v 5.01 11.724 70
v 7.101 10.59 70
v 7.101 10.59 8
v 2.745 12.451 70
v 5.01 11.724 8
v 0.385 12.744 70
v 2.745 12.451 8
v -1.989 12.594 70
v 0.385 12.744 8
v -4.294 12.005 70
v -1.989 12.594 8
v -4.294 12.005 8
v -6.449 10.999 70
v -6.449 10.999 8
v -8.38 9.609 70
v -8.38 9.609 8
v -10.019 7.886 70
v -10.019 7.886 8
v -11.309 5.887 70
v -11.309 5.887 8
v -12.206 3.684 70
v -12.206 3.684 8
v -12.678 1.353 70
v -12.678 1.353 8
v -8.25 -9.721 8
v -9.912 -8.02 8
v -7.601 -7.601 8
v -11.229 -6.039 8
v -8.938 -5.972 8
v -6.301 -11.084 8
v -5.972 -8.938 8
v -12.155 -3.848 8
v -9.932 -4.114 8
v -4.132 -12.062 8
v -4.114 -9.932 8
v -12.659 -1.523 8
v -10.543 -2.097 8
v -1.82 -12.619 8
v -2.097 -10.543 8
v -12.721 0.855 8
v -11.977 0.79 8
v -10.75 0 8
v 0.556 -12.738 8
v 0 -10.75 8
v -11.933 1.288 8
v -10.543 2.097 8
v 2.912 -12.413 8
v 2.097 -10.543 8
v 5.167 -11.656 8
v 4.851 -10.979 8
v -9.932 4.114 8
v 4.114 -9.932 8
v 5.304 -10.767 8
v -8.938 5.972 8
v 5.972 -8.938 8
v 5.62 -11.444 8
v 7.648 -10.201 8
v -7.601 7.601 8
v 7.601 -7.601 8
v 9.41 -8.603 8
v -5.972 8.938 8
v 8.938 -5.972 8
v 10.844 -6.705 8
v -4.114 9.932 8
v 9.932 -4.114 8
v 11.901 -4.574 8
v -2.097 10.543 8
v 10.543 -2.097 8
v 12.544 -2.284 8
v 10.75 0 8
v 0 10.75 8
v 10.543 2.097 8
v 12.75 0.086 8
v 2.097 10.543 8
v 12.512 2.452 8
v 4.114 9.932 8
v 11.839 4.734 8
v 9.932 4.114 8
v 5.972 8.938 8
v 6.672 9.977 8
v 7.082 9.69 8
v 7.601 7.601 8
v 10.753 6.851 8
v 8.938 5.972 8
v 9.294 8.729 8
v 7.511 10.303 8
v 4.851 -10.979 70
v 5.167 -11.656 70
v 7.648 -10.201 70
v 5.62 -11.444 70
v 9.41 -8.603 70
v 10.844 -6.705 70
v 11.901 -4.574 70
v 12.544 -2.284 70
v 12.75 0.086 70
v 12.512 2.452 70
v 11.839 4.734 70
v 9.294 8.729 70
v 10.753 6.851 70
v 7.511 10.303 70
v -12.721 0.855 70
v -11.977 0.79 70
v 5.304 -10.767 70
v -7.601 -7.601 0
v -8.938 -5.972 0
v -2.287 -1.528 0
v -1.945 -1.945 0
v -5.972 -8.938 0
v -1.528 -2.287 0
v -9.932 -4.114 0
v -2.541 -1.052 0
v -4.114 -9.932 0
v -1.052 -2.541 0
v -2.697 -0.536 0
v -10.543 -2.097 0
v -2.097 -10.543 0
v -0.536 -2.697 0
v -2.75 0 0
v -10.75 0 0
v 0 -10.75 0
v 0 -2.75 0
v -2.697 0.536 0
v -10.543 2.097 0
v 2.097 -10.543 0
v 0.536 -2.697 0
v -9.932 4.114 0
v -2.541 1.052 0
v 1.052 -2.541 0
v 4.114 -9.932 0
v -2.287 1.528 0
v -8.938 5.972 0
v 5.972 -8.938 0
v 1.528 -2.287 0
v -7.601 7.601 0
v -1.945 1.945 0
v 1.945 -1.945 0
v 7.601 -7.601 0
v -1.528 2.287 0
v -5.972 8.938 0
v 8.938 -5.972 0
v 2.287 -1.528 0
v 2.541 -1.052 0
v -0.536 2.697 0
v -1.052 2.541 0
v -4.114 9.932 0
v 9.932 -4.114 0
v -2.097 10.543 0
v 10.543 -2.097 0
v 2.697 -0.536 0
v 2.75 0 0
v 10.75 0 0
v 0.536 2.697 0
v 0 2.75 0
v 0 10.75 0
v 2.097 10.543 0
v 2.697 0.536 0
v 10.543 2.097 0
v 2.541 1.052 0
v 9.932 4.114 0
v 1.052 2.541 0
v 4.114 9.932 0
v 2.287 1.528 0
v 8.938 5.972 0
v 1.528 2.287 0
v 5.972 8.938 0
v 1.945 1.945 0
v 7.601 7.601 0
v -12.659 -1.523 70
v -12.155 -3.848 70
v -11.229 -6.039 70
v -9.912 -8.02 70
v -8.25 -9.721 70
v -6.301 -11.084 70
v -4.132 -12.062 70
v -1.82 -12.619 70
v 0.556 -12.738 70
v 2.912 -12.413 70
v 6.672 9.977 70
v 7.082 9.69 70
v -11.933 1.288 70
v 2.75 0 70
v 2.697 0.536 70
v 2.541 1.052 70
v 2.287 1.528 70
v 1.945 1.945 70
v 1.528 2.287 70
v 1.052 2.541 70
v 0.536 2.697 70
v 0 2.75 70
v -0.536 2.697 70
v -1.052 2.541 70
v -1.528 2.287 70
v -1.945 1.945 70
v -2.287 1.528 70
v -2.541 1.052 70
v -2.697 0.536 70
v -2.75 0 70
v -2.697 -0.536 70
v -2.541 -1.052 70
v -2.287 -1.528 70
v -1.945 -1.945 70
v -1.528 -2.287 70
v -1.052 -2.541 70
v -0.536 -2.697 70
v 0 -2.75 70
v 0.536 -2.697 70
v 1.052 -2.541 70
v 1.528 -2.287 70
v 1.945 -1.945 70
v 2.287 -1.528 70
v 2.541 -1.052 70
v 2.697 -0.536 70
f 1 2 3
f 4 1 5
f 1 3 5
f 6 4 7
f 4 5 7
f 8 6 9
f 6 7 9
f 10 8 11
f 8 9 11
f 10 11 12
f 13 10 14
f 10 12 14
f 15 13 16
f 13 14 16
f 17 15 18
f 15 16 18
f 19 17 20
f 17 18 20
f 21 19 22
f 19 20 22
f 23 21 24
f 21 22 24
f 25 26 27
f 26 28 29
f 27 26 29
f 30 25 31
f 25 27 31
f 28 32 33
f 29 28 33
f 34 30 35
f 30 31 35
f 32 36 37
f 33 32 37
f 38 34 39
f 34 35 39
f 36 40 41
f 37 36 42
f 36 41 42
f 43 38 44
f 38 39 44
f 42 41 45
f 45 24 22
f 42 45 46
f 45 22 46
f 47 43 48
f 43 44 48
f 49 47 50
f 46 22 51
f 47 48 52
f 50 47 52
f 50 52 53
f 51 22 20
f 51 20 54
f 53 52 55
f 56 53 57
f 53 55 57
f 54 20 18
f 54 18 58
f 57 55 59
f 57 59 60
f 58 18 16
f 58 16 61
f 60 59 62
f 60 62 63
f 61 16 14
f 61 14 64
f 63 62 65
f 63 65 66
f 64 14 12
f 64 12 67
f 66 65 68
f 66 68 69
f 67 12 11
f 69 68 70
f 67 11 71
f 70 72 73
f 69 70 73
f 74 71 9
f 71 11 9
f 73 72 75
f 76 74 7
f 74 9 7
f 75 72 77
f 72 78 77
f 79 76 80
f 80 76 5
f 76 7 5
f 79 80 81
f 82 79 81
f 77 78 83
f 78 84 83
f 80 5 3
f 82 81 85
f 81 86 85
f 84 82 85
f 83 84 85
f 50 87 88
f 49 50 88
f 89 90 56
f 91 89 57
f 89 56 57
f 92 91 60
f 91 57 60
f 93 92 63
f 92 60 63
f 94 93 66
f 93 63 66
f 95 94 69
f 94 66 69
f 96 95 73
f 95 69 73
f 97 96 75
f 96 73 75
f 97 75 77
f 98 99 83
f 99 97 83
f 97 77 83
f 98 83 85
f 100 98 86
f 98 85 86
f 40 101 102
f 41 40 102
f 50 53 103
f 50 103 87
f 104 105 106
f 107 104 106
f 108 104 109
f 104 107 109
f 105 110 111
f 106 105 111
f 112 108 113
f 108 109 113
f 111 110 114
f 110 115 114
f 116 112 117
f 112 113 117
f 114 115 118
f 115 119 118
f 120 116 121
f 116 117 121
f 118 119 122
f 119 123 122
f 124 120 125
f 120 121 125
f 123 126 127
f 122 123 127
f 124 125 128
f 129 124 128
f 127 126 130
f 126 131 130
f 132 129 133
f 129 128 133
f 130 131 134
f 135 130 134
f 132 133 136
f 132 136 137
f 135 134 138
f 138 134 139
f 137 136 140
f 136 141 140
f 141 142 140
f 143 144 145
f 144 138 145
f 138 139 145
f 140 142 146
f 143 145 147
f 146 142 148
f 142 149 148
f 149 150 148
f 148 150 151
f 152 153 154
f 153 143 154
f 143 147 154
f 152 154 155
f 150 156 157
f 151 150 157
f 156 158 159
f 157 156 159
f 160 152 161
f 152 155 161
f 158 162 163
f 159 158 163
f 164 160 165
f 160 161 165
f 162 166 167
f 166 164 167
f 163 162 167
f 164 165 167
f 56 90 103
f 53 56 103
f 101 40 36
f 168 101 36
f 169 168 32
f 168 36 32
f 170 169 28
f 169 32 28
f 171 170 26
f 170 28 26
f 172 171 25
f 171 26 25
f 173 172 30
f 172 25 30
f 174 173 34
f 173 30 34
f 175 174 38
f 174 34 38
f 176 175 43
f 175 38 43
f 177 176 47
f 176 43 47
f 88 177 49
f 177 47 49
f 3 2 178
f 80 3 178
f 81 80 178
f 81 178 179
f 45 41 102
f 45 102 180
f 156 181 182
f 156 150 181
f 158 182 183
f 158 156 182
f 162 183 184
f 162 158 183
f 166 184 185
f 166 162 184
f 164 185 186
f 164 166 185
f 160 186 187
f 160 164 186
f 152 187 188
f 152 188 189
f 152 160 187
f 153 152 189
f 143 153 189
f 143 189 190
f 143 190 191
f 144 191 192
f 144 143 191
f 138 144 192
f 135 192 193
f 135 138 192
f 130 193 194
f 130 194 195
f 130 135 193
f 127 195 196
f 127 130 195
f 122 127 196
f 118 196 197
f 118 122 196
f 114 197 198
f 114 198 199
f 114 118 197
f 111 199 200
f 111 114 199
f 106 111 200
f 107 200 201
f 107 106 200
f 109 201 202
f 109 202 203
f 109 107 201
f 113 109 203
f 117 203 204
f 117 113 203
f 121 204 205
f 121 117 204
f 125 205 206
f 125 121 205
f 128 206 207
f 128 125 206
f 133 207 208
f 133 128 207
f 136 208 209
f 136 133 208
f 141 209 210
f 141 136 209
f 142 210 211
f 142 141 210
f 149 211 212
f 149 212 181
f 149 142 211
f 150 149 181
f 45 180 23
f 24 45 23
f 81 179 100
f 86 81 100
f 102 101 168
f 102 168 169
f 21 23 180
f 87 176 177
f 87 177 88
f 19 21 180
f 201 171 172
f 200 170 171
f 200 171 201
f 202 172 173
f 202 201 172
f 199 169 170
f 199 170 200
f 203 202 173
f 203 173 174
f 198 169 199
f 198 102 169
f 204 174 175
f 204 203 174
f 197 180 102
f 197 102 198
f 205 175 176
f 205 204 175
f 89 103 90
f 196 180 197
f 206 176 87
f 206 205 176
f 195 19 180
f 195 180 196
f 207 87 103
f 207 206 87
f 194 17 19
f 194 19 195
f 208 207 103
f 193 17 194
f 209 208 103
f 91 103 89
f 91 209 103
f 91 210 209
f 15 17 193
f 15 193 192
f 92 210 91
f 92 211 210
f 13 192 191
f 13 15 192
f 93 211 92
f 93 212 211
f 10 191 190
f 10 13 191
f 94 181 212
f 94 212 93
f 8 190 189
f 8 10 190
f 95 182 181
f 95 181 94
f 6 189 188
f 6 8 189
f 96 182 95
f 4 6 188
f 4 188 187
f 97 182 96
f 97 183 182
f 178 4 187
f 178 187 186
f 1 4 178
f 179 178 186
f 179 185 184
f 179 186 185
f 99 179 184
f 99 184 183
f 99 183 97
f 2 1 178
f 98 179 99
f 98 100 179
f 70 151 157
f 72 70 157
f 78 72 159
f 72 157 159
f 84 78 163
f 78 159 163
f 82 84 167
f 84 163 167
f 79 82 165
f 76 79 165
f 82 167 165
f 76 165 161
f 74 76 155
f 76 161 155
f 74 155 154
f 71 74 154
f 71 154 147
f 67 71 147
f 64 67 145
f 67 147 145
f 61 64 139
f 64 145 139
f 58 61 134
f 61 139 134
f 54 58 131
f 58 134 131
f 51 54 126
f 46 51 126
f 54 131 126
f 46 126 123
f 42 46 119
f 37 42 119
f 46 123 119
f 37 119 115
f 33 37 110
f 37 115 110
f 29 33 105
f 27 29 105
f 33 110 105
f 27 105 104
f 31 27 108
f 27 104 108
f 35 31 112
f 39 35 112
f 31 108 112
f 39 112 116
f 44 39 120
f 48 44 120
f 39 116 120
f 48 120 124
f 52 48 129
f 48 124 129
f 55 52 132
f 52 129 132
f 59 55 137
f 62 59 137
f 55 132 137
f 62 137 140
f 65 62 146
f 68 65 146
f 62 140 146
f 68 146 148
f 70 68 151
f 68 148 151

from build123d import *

# Parameters (mm, degrees)
ESQUISSE1_R             = 10.75
ESQUISSE1_R_2           = 2.75
BASE_EXTRUSION_DEPTH    = 8
ESQUISSE2_R             = 12.75
ESQUISSE2_R_2           = 2.75
BOSS_EXTRU_1_DEPTH      = 62
ENL_V_MAT_EXTRU_1_REACH = 74.285


with BuildPart() as part:
    # Esquisse1 → Base-Extrusion (new body)
    with BuildSketch(Plane.XY):
        Circle(ESQUISSE1_R)
        Circle(ESQUISSE1_R_2, mode=Mode.SUBTRACT)
    extrude(amount=BASE_EXTRUSION_DEPTH)

    # Esquisse2 → Boss.-Extru.1 (add)
    with BuildSketch(Plane.XY.offset(8)):
        Circle(ESQUISSE2_R)
        Circle(ESQUISSE2_R_2, mode=Mode.SUBTRACT)
    extrude(amount=BOSS_EXTRU_1_DEPTH)

    # Esquisse4 → Enlèv. mat.-Extru.1 (cut, up to next)
    with BuildSketch(Plane.XY.offset(70), mode=Mode.PRIVATE) as enl_v_mat_extru_1_sk1:
        with BuildLine():
            Line((7.158163625, 10.671606885), (6.672416375, 9.977041632))
            Line((6.672416375, 9.977041632), (7.082156576, 9.690488028))
            Line((7.082156576, 9.690488028), (7.567903827, 10.385053282))
            ThreePointArc((7.567903827, 10.385053282), (7.364427601, 10.530323172), (7.158163625, 10.671606885))
        make_face()
    enl_v_mat_extru_1_tool1 = extrude(enl_v_mat_extru_1_sk1.sketch, amount=-ENL_V_MAT_EXTRU_1_REACH, mode=Mode.PRIVATE) & part.part
    # Esquisse4 → Enlèv. mat.-Extru.1 (cut, up to next)
    with BuildSketch(Plane.XY.offset(70), mode=Mode.PRIVATE) as enl_v_mat_extru_1_sk2:
        with BuildLine():
            Line((5.662800849, -11.534954987), (5.30416332, -10.767002901))
            Line((5.30416332, -10.767002901), (4.851130519, -10.978571523))
            Line((4.851130519, -10.978571523), (5.209768049, -11.746523608))
            ThreePointArc((5.209768049, -11.746523608), (5.437313576, -11.642942973), (5.662800849, -11.534954987))
        make_face()
    enl_v_mat_extru_1_tool2 = extrude(enl_v_mat_extru_1_sk2.sketch, amount=-ENL_V_MAT_EXTRU_1_REACH, mode=Mode.PRIVATE) & part.part
    # Esquisse4 → Enlèv. mat.-Extru.1 (cut, up to next)
    with BuildSketch(Plane.XY.offset(70), mode=Mode.PRIVATE) as enl_v_mat_extru_1_sk3:
        with BuildLine():
            Line((-12.820964474, 0.863348101), (-11.976579695, 0.78996127))
            Line((-11.976579695, 0.78996127), (-11.933287096, 1.288083495))
            Line((-11.933287096, 1.288083495), (-12.777671875, 1.361470326))
            ThreePointArc((-12.777671875, 1.361470326), (-12.801741178, 1.112619801), (-12.820964474, 0.863348101))
        make_face()
    enl_v_mat_extru_1_tool3 = extrude(enl_v_mat_extru_1_sk3.sketch, amount=-ENL_V_MAT_EXTRU_1_REACH, mode=Mode.PRIVATE) & part.part
    add(enl_v_mat_extru_1_tool1.solids().sort_by_distance((7.120625, 10.181712, 70))[0], mode=Mode.SUBTRACT)
    add(enl_v_mat_extru_1_tool2.solids().sort_by_distance((5.257309, -11.257498, 70))[0], mode=Mode.SUBTRACT)
    add(enl_v_mat_extru_1_tool3.solids().sort_by_distance((-12.377934, 1.075786, 70))[0], mode=Mode.SUBTRACT)


solid = part.part
